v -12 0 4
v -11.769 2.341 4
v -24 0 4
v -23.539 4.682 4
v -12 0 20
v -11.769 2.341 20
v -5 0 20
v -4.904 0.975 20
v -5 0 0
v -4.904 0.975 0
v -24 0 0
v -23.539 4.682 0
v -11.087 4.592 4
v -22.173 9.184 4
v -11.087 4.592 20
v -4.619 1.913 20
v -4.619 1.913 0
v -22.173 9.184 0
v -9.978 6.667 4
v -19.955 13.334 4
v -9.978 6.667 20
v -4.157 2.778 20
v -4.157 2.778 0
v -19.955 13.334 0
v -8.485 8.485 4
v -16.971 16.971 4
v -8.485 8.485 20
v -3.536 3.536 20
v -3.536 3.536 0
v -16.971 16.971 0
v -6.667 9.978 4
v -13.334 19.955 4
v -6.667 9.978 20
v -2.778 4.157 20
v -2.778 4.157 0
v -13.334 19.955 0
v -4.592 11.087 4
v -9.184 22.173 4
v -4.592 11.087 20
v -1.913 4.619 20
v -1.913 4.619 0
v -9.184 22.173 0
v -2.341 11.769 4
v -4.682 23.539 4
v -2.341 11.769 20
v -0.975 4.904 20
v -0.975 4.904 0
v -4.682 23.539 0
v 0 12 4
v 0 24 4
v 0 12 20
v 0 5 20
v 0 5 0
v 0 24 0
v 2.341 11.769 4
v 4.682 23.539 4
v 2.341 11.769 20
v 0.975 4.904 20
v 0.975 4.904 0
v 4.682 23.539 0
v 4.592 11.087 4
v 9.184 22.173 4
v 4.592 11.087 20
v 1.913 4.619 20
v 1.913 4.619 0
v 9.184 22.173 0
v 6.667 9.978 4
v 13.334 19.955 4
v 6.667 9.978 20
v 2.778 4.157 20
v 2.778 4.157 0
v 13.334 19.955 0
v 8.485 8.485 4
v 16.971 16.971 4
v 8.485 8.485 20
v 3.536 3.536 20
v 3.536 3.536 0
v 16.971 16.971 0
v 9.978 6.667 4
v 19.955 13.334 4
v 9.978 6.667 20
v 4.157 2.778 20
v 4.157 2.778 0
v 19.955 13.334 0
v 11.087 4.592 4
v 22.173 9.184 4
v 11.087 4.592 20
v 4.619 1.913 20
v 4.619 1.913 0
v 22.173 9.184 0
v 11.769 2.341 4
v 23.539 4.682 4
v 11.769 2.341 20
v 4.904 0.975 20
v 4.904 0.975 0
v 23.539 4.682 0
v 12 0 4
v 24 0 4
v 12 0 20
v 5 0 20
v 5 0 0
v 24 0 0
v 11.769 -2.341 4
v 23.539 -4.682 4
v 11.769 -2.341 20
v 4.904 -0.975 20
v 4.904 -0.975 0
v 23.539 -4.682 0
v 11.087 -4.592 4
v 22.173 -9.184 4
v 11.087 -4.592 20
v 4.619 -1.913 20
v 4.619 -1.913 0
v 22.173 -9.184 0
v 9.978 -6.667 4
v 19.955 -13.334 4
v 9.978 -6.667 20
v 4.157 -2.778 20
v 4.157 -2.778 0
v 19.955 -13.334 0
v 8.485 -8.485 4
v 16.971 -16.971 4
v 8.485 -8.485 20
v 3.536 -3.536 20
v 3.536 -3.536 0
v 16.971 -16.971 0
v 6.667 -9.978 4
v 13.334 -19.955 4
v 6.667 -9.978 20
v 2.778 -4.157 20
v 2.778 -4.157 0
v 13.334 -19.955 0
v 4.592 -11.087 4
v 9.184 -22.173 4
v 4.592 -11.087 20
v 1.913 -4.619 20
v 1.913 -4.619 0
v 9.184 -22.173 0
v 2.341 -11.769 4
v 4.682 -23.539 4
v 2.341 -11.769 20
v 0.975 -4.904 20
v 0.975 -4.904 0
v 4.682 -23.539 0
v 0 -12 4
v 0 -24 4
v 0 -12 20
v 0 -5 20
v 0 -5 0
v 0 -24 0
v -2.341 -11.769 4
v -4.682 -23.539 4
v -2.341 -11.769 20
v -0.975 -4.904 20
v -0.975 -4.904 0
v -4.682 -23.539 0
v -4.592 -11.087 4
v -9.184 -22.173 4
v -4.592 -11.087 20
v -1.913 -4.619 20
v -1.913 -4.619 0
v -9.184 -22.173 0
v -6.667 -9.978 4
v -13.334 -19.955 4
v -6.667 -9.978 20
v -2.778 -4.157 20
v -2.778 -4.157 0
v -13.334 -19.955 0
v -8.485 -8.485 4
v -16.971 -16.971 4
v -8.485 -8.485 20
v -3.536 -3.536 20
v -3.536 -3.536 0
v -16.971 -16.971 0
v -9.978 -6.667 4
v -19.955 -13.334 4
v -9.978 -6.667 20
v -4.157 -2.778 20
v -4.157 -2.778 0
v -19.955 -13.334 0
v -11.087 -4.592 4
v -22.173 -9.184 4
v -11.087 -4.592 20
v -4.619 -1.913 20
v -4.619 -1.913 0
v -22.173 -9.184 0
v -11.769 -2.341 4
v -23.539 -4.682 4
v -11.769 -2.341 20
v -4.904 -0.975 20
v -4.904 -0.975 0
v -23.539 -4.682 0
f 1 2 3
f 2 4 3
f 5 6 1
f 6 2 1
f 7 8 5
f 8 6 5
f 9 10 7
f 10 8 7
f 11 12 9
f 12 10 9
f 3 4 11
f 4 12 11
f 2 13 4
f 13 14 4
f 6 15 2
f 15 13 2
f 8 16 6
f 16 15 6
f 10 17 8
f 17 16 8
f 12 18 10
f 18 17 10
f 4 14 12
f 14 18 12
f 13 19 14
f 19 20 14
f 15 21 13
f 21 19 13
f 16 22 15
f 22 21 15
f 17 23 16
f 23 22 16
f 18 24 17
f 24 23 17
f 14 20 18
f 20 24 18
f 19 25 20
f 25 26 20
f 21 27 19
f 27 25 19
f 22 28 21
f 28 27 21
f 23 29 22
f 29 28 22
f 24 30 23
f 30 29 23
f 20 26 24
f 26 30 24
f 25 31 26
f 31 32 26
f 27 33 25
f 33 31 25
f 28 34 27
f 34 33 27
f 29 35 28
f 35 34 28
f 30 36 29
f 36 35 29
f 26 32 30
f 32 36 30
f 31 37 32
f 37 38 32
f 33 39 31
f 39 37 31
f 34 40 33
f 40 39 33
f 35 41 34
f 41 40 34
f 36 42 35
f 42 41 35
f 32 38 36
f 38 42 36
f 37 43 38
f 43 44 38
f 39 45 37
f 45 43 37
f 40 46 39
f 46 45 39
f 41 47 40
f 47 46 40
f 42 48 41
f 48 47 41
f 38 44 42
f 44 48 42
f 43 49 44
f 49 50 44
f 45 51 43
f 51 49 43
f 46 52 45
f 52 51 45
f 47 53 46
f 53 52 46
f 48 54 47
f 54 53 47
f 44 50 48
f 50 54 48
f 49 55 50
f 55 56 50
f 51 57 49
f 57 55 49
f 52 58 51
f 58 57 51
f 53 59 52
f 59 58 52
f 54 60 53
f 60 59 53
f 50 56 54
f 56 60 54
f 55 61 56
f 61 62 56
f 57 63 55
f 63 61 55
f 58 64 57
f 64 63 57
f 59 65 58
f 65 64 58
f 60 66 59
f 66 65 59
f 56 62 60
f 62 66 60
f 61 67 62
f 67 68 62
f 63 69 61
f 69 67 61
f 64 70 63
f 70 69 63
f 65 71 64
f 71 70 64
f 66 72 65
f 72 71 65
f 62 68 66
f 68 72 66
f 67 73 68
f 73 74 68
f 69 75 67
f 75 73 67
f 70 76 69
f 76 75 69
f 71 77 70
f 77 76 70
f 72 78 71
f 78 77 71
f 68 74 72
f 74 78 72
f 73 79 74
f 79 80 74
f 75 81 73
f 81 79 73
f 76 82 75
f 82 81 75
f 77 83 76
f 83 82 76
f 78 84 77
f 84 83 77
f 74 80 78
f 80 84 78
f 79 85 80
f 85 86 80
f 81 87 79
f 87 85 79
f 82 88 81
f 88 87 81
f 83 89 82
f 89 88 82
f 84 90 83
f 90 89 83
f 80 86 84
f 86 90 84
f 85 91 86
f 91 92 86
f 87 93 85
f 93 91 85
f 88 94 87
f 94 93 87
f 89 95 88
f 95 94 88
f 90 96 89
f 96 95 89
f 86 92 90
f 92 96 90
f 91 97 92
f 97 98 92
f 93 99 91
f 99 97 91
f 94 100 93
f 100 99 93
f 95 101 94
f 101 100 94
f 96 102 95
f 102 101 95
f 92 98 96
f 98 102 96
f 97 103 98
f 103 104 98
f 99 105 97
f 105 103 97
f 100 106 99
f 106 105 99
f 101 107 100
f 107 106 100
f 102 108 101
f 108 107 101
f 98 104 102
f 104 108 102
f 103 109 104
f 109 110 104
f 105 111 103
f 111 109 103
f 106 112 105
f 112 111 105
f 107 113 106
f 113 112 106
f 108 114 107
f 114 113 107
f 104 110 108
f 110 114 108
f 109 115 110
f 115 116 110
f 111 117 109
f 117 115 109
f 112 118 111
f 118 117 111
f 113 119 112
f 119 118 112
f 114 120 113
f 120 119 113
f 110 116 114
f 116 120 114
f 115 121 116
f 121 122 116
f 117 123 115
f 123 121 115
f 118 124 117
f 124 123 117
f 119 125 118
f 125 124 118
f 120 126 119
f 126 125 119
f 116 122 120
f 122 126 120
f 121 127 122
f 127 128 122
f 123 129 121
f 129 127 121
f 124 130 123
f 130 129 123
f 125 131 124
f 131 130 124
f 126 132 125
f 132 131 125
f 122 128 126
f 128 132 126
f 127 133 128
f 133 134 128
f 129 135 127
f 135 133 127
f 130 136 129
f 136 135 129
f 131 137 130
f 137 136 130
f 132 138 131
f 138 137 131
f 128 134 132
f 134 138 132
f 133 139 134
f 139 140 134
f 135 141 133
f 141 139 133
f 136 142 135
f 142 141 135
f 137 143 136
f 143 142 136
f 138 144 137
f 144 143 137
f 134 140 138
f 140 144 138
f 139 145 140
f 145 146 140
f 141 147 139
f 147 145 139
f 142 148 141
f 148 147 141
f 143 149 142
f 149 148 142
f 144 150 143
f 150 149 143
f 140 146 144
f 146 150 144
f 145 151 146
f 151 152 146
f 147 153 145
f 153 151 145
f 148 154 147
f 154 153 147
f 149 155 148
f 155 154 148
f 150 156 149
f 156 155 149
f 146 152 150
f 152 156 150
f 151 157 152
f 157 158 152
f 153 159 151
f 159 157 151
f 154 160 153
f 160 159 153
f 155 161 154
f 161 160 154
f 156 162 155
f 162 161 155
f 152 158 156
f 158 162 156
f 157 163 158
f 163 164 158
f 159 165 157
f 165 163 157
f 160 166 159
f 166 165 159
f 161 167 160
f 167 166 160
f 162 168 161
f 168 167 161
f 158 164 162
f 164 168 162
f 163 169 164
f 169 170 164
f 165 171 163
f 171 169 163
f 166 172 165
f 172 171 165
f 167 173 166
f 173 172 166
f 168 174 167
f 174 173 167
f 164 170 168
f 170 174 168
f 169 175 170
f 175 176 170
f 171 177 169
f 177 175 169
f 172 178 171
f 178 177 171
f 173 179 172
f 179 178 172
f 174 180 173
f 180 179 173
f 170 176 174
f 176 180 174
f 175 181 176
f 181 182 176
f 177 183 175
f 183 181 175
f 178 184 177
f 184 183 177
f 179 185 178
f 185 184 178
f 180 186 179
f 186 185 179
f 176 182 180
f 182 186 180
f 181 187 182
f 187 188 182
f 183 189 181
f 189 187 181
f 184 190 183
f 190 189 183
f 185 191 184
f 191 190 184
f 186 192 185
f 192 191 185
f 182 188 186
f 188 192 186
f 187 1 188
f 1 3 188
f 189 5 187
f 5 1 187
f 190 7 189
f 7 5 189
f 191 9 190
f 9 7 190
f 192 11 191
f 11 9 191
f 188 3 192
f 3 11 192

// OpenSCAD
$fn = 32;

// ----------------------------------------------------------------------
// Revolved part: flanged bushing R24
// ----------------------------------------------------------------------

// --- parameters (mm) ---
bore_r = 5;               // bore radius
flange_r = 24;            // flange radius
flange_h = 4;             // flange thickness
sleeve_r = 12;            // sleeve radius
total_h = 20;             // overall height
revolve_angle = 360;      // revolve sweep, degrees

bore_d = 2 * bore_r;
flange_d = 2 * flange_r;
sleeve_d = 2 * sleeve_r;

profile = [[5, 0], [24, 0], [24, 4], [12, 4], [12, 20], [5, 20]];  // primary outline, 6 points, counter clockwise

// --- the one profile operation ---
rotate_extrude(angle = revolve_angle) polygon(points = profile);
